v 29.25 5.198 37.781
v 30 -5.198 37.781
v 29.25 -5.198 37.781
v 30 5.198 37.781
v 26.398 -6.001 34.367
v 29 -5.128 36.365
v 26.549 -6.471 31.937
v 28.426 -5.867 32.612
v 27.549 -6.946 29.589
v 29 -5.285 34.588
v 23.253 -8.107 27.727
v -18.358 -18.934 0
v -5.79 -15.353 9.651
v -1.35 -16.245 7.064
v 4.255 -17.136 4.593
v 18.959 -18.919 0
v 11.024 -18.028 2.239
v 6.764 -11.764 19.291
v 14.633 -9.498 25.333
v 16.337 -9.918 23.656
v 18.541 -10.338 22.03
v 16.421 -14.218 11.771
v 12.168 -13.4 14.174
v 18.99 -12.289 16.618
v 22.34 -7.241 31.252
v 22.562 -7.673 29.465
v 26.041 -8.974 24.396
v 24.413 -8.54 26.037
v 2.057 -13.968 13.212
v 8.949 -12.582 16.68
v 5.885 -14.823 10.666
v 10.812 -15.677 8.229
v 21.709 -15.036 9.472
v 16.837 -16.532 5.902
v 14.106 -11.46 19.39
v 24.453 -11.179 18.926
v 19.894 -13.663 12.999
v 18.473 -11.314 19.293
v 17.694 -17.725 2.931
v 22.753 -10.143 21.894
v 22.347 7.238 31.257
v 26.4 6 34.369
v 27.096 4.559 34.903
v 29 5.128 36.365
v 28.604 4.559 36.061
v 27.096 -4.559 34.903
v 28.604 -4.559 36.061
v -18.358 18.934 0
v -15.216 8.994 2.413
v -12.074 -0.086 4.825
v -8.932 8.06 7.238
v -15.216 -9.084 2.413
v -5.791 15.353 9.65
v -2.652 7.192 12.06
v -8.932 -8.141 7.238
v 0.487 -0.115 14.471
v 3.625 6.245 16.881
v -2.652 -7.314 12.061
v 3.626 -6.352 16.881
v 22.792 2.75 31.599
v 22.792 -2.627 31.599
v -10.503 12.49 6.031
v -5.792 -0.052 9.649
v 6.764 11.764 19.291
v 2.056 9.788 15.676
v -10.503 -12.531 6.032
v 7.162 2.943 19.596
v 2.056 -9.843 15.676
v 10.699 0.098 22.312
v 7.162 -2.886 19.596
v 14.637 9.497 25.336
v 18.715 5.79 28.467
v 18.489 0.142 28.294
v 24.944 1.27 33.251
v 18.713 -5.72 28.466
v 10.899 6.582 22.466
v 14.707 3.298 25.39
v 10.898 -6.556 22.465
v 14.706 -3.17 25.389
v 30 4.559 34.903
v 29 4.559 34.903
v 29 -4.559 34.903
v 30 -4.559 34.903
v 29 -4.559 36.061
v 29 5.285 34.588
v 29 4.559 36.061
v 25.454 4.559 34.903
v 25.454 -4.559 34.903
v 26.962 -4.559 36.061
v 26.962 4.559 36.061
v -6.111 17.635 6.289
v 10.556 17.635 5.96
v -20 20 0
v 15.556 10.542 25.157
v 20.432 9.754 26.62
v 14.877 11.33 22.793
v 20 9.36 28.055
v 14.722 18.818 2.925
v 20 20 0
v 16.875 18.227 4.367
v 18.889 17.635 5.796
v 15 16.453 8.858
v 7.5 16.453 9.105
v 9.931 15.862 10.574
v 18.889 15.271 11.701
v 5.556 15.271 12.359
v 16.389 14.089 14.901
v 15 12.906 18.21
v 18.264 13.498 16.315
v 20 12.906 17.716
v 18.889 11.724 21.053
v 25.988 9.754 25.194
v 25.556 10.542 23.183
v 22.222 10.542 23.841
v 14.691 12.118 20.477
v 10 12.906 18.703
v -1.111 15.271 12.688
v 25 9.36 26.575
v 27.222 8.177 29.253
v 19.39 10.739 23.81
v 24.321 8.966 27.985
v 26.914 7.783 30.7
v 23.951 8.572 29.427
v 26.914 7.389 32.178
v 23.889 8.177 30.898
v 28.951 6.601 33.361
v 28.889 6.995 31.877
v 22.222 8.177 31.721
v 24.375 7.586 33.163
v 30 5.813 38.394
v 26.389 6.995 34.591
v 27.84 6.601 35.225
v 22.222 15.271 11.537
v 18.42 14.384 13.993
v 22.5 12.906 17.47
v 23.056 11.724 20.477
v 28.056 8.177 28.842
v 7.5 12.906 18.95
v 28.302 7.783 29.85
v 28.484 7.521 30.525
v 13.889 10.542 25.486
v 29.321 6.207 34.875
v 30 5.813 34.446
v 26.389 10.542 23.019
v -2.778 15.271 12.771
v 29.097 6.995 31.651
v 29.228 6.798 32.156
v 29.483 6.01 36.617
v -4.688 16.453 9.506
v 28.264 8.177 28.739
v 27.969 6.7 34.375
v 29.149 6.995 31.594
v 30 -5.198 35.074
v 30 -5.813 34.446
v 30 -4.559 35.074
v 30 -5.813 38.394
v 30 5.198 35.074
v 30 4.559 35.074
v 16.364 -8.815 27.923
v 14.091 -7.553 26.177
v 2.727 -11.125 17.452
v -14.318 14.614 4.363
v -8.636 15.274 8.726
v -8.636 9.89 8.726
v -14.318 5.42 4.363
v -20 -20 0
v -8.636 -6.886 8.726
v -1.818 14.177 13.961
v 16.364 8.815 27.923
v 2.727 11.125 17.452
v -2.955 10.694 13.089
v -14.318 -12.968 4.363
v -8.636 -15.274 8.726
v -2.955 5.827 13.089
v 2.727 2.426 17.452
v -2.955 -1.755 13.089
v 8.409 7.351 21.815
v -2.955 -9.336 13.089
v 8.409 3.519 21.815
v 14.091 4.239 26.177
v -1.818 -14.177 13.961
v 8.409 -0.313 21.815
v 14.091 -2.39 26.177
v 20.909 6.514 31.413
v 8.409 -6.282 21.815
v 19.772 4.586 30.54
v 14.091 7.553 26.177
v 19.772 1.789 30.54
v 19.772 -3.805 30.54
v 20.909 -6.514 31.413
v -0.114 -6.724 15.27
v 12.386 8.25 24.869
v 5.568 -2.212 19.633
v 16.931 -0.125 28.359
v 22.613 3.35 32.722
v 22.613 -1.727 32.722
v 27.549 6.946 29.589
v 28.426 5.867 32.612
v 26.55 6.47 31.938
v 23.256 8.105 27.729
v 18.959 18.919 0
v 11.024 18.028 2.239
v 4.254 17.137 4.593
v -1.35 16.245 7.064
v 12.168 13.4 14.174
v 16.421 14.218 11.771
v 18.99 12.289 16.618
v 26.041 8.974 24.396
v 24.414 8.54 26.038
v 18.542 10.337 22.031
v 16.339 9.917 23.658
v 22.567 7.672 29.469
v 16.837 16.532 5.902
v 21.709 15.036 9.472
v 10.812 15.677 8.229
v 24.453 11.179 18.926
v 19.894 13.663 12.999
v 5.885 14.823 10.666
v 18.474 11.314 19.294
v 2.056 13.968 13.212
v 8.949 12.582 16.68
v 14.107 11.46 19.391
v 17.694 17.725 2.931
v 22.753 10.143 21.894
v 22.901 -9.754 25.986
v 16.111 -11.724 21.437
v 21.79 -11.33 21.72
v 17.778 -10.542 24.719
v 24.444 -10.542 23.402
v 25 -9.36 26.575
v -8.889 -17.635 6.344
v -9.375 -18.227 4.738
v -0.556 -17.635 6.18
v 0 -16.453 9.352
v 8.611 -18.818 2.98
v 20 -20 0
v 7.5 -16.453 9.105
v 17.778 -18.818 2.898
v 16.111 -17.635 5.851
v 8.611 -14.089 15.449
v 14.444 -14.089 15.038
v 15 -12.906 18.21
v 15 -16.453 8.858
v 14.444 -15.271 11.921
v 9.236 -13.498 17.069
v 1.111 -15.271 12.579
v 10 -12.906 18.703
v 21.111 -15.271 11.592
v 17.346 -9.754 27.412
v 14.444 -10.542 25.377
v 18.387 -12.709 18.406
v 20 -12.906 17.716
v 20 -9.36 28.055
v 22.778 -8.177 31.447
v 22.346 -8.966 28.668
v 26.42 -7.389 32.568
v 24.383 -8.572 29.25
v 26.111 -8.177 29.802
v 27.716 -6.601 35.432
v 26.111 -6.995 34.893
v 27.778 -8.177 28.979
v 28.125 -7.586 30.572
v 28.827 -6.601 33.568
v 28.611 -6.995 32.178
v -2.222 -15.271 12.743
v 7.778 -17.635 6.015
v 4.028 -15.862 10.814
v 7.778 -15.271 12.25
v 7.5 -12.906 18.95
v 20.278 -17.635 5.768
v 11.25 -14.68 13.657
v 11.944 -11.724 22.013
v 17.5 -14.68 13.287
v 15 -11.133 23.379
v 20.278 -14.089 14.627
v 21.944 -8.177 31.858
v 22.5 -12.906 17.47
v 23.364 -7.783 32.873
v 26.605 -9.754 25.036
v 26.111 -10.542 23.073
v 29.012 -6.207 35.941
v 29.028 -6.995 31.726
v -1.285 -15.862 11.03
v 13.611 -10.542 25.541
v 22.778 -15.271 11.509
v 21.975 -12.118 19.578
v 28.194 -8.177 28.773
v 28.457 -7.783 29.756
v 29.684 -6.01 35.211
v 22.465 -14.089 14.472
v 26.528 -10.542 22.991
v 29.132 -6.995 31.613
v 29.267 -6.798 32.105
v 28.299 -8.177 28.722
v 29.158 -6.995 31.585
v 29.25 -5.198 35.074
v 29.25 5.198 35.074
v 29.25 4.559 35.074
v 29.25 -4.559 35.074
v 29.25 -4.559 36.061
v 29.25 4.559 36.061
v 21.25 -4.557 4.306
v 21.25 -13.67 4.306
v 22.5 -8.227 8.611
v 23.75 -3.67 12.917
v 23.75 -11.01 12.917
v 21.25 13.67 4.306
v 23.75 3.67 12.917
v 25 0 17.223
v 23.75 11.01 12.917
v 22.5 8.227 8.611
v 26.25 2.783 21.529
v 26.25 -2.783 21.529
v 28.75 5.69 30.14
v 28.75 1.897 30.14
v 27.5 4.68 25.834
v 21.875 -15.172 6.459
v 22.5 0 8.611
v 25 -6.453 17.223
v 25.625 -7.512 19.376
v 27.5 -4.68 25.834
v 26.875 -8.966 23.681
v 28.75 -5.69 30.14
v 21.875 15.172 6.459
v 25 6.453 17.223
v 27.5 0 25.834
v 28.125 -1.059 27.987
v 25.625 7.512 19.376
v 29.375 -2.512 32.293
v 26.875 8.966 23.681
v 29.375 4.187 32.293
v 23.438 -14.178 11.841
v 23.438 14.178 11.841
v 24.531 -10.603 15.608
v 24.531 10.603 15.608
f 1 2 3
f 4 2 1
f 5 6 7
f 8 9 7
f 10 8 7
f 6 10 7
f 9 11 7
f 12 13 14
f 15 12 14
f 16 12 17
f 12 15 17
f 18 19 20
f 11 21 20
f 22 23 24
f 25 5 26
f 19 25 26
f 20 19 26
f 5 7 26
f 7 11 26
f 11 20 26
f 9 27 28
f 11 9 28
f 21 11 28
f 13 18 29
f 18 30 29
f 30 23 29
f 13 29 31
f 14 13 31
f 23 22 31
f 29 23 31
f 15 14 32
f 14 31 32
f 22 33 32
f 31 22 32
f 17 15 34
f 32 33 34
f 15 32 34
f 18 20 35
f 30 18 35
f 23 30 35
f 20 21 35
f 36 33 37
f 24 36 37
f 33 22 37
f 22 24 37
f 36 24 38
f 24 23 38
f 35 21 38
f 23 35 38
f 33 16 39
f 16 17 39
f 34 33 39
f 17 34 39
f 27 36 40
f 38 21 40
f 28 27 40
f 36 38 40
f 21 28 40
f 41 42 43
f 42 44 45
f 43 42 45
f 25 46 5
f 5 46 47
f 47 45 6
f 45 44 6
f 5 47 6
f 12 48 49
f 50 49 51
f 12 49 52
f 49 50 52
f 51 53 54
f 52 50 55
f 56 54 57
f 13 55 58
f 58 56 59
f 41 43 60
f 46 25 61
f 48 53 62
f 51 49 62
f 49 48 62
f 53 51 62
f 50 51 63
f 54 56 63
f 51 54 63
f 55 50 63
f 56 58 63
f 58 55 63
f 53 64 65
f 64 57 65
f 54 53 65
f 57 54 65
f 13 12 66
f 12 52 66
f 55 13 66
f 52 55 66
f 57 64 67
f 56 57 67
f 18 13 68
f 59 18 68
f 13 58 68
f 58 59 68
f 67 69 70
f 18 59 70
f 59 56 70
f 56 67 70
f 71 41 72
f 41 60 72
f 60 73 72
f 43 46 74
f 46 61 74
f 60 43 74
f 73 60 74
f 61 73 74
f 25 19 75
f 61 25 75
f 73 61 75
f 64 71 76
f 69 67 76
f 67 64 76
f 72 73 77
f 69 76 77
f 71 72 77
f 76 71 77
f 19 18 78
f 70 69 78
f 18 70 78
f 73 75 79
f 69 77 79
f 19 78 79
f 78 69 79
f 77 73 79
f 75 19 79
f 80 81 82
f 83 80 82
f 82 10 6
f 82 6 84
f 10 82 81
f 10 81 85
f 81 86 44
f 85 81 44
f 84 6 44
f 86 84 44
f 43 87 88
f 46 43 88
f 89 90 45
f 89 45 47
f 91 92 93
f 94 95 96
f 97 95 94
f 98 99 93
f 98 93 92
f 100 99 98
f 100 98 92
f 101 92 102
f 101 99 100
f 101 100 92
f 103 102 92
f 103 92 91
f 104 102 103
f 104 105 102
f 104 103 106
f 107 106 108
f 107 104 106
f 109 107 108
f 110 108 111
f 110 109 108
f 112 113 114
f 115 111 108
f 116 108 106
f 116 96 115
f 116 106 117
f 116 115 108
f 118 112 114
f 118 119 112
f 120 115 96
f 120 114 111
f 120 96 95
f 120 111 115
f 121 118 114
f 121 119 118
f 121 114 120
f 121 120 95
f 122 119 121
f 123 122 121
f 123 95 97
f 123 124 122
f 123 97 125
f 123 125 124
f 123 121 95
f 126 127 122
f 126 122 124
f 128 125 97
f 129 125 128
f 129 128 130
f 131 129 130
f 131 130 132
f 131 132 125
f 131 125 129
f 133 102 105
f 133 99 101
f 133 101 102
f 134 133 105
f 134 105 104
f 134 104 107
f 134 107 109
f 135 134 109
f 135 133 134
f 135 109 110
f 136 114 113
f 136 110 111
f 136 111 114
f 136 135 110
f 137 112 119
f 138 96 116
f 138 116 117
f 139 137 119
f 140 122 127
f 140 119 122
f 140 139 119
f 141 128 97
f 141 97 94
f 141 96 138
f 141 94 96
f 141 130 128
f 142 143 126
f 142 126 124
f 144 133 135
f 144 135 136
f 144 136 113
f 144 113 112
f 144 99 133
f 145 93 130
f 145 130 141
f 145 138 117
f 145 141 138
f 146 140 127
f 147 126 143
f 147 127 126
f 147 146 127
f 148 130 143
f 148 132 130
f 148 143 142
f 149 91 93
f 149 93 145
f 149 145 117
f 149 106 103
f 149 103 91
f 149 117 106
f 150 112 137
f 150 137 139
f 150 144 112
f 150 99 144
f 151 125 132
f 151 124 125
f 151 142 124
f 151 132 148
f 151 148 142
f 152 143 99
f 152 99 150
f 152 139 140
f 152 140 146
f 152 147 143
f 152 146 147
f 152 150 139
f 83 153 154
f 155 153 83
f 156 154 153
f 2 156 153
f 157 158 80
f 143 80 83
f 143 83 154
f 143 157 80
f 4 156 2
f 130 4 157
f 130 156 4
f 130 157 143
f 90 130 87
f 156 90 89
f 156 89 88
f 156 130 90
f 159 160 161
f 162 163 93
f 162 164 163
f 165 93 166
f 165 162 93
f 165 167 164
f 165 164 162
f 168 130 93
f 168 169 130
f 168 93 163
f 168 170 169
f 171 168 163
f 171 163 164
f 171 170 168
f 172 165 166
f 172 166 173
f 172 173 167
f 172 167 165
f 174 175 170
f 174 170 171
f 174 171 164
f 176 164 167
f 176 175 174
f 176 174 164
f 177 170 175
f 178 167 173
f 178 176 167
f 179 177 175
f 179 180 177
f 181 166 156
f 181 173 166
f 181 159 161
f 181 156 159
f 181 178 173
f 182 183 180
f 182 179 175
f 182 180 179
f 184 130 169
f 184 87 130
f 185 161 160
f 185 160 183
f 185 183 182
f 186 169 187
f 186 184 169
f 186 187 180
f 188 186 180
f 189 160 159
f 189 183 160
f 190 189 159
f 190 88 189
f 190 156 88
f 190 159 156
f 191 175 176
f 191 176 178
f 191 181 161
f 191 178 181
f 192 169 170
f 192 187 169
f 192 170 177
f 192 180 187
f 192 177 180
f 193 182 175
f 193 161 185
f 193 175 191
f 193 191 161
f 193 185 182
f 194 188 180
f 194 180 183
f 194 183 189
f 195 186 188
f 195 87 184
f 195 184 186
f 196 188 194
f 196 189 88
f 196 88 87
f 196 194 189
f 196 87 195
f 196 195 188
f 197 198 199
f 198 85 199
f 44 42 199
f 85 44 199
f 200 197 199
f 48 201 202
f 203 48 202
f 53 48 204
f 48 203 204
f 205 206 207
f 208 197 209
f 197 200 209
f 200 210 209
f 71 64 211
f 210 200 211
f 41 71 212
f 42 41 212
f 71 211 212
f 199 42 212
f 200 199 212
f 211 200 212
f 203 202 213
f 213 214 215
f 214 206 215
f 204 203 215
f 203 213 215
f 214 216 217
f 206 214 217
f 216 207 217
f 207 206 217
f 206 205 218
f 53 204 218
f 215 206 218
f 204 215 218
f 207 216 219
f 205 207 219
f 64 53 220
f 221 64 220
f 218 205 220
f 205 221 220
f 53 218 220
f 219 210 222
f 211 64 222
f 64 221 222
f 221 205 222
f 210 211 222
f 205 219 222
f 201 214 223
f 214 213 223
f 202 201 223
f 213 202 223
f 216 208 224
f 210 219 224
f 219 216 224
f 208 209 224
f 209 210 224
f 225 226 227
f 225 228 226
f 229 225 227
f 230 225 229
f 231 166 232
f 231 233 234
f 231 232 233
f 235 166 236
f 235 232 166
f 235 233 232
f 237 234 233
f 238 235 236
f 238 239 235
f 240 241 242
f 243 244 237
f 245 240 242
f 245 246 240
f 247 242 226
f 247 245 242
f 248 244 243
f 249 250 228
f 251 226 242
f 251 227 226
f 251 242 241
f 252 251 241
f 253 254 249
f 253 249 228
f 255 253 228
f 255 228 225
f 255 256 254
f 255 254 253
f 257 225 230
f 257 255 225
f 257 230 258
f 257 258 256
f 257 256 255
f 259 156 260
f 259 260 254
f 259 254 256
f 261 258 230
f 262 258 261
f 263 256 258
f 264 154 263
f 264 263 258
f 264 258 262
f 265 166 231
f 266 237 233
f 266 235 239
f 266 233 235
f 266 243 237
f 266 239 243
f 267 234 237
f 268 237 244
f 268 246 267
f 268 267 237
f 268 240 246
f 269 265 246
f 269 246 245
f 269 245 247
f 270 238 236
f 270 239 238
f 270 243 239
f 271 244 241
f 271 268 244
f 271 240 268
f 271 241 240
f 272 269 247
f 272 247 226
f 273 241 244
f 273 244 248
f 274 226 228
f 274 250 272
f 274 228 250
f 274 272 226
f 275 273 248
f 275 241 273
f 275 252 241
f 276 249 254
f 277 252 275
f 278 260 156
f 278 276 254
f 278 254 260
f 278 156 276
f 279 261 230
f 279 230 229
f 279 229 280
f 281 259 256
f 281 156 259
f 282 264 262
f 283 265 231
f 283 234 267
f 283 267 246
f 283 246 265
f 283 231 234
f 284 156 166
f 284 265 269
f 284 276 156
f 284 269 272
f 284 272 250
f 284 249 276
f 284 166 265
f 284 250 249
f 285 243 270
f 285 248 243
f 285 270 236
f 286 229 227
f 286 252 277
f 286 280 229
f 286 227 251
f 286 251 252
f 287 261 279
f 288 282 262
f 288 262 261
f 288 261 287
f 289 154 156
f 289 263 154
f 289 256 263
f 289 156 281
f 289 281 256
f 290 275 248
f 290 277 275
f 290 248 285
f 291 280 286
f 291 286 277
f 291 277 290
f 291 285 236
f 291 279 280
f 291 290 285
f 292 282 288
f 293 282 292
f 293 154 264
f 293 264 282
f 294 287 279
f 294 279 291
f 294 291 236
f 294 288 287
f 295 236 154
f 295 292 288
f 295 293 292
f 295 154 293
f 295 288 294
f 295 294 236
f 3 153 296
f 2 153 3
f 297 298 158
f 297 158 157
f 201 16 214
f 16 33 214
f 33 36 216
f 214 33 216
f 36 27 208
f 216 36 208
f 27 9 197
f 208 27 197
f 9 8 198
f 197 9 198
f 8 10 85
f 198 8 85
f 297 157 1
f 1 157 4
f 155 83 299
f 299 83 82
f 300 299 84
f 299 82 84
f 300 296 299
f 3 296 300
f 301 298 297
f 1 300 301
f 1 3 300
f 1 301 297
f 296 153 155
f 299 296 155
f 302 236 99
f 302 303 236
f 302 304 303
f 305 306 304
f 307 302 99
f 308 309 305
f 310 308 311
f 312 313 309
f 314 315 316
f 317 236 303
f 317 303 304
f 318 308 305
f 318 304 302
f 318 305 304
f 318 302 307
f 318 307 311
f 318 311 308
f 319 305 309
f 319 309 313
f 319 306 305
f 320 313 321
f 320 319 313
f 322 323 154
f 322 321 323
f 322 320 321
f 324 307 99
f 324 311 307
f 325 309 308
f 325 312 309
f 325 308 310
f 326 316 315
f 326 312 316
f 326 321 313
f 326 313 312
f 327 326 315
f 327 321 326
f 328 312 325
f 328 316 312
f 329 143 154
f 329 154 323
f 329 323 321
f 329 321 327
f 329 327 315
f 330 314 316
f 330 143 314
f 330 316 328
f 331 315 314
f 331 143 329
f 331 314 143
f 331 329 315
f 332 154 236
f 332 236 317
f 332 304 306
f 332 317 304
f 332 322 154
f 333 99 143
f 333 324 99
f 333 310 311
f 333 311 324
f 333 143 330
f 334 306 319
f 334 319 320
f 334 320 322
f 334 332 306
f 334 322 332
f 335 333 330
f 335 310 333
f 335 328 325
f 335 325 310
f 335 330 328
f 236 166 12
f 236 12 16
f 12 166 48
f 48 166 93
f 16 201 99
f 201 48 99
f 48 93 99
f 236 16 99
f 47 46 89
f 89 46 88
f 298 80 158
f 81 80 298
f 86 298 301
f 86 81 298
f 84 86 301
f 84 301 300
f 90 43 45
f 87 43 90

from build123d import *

# Parameters (mm, degrees)
F2_W     = 40
F2_H     = 40
F1_W     = 11.62594
F1_H     = 3.948428
F4_T     = -1
F5_W     = 10.396668
F5_H     = 2.707422
F6_DEPTH = 0.75
F7_W     = 9.11848
F7_H     = 1.157649
F8_DEPTH = 12.5


with BuildPart() as f3:
    # F2 (on Top) → F3 section 0
    with BuildSketch(Plane.XY):
        Rectangle(F2_W, F2_H)
    # F1 (on offset) → F3 section 1
    with BuildSketch(Plane.YZ.offset(30)):
        with Locations((0, 36.419885)):
            Rectangle(F1_W, F1_H)
    loft()

    # F4
    f4_openings = [f3.faces().sort_by_distance(p)[0] for p in [
        (0, 0, 0),
    ]]
    offset(amount=F4_T, openings=f4_openings)

    # F5 (on face) → F6 (cut, symmetric)
    with BuildSketch(Plane.YZ.offset(30)):
        with Locations((0, 36.427658)):
            Rectangle(F5_W, F5_H)
    extrude(amount=F6_DEPTH, both=True, mode=Mode.SUBTRACT)

    # F7 (on face) → F8 (cut, symmetric)
    with BuildSketch(Plane(origin=(29, 0, 0), x_dir=(0, -1, 0), z_dir=(-1, 0, 0))):
        with Locations((0, 35.482139)):
            Rectangle(F7_W, F7_H)
    extrude(amount=F8_DEPTH, both=True, mode=Mode.SUBTRACT)


solid = f3.part
